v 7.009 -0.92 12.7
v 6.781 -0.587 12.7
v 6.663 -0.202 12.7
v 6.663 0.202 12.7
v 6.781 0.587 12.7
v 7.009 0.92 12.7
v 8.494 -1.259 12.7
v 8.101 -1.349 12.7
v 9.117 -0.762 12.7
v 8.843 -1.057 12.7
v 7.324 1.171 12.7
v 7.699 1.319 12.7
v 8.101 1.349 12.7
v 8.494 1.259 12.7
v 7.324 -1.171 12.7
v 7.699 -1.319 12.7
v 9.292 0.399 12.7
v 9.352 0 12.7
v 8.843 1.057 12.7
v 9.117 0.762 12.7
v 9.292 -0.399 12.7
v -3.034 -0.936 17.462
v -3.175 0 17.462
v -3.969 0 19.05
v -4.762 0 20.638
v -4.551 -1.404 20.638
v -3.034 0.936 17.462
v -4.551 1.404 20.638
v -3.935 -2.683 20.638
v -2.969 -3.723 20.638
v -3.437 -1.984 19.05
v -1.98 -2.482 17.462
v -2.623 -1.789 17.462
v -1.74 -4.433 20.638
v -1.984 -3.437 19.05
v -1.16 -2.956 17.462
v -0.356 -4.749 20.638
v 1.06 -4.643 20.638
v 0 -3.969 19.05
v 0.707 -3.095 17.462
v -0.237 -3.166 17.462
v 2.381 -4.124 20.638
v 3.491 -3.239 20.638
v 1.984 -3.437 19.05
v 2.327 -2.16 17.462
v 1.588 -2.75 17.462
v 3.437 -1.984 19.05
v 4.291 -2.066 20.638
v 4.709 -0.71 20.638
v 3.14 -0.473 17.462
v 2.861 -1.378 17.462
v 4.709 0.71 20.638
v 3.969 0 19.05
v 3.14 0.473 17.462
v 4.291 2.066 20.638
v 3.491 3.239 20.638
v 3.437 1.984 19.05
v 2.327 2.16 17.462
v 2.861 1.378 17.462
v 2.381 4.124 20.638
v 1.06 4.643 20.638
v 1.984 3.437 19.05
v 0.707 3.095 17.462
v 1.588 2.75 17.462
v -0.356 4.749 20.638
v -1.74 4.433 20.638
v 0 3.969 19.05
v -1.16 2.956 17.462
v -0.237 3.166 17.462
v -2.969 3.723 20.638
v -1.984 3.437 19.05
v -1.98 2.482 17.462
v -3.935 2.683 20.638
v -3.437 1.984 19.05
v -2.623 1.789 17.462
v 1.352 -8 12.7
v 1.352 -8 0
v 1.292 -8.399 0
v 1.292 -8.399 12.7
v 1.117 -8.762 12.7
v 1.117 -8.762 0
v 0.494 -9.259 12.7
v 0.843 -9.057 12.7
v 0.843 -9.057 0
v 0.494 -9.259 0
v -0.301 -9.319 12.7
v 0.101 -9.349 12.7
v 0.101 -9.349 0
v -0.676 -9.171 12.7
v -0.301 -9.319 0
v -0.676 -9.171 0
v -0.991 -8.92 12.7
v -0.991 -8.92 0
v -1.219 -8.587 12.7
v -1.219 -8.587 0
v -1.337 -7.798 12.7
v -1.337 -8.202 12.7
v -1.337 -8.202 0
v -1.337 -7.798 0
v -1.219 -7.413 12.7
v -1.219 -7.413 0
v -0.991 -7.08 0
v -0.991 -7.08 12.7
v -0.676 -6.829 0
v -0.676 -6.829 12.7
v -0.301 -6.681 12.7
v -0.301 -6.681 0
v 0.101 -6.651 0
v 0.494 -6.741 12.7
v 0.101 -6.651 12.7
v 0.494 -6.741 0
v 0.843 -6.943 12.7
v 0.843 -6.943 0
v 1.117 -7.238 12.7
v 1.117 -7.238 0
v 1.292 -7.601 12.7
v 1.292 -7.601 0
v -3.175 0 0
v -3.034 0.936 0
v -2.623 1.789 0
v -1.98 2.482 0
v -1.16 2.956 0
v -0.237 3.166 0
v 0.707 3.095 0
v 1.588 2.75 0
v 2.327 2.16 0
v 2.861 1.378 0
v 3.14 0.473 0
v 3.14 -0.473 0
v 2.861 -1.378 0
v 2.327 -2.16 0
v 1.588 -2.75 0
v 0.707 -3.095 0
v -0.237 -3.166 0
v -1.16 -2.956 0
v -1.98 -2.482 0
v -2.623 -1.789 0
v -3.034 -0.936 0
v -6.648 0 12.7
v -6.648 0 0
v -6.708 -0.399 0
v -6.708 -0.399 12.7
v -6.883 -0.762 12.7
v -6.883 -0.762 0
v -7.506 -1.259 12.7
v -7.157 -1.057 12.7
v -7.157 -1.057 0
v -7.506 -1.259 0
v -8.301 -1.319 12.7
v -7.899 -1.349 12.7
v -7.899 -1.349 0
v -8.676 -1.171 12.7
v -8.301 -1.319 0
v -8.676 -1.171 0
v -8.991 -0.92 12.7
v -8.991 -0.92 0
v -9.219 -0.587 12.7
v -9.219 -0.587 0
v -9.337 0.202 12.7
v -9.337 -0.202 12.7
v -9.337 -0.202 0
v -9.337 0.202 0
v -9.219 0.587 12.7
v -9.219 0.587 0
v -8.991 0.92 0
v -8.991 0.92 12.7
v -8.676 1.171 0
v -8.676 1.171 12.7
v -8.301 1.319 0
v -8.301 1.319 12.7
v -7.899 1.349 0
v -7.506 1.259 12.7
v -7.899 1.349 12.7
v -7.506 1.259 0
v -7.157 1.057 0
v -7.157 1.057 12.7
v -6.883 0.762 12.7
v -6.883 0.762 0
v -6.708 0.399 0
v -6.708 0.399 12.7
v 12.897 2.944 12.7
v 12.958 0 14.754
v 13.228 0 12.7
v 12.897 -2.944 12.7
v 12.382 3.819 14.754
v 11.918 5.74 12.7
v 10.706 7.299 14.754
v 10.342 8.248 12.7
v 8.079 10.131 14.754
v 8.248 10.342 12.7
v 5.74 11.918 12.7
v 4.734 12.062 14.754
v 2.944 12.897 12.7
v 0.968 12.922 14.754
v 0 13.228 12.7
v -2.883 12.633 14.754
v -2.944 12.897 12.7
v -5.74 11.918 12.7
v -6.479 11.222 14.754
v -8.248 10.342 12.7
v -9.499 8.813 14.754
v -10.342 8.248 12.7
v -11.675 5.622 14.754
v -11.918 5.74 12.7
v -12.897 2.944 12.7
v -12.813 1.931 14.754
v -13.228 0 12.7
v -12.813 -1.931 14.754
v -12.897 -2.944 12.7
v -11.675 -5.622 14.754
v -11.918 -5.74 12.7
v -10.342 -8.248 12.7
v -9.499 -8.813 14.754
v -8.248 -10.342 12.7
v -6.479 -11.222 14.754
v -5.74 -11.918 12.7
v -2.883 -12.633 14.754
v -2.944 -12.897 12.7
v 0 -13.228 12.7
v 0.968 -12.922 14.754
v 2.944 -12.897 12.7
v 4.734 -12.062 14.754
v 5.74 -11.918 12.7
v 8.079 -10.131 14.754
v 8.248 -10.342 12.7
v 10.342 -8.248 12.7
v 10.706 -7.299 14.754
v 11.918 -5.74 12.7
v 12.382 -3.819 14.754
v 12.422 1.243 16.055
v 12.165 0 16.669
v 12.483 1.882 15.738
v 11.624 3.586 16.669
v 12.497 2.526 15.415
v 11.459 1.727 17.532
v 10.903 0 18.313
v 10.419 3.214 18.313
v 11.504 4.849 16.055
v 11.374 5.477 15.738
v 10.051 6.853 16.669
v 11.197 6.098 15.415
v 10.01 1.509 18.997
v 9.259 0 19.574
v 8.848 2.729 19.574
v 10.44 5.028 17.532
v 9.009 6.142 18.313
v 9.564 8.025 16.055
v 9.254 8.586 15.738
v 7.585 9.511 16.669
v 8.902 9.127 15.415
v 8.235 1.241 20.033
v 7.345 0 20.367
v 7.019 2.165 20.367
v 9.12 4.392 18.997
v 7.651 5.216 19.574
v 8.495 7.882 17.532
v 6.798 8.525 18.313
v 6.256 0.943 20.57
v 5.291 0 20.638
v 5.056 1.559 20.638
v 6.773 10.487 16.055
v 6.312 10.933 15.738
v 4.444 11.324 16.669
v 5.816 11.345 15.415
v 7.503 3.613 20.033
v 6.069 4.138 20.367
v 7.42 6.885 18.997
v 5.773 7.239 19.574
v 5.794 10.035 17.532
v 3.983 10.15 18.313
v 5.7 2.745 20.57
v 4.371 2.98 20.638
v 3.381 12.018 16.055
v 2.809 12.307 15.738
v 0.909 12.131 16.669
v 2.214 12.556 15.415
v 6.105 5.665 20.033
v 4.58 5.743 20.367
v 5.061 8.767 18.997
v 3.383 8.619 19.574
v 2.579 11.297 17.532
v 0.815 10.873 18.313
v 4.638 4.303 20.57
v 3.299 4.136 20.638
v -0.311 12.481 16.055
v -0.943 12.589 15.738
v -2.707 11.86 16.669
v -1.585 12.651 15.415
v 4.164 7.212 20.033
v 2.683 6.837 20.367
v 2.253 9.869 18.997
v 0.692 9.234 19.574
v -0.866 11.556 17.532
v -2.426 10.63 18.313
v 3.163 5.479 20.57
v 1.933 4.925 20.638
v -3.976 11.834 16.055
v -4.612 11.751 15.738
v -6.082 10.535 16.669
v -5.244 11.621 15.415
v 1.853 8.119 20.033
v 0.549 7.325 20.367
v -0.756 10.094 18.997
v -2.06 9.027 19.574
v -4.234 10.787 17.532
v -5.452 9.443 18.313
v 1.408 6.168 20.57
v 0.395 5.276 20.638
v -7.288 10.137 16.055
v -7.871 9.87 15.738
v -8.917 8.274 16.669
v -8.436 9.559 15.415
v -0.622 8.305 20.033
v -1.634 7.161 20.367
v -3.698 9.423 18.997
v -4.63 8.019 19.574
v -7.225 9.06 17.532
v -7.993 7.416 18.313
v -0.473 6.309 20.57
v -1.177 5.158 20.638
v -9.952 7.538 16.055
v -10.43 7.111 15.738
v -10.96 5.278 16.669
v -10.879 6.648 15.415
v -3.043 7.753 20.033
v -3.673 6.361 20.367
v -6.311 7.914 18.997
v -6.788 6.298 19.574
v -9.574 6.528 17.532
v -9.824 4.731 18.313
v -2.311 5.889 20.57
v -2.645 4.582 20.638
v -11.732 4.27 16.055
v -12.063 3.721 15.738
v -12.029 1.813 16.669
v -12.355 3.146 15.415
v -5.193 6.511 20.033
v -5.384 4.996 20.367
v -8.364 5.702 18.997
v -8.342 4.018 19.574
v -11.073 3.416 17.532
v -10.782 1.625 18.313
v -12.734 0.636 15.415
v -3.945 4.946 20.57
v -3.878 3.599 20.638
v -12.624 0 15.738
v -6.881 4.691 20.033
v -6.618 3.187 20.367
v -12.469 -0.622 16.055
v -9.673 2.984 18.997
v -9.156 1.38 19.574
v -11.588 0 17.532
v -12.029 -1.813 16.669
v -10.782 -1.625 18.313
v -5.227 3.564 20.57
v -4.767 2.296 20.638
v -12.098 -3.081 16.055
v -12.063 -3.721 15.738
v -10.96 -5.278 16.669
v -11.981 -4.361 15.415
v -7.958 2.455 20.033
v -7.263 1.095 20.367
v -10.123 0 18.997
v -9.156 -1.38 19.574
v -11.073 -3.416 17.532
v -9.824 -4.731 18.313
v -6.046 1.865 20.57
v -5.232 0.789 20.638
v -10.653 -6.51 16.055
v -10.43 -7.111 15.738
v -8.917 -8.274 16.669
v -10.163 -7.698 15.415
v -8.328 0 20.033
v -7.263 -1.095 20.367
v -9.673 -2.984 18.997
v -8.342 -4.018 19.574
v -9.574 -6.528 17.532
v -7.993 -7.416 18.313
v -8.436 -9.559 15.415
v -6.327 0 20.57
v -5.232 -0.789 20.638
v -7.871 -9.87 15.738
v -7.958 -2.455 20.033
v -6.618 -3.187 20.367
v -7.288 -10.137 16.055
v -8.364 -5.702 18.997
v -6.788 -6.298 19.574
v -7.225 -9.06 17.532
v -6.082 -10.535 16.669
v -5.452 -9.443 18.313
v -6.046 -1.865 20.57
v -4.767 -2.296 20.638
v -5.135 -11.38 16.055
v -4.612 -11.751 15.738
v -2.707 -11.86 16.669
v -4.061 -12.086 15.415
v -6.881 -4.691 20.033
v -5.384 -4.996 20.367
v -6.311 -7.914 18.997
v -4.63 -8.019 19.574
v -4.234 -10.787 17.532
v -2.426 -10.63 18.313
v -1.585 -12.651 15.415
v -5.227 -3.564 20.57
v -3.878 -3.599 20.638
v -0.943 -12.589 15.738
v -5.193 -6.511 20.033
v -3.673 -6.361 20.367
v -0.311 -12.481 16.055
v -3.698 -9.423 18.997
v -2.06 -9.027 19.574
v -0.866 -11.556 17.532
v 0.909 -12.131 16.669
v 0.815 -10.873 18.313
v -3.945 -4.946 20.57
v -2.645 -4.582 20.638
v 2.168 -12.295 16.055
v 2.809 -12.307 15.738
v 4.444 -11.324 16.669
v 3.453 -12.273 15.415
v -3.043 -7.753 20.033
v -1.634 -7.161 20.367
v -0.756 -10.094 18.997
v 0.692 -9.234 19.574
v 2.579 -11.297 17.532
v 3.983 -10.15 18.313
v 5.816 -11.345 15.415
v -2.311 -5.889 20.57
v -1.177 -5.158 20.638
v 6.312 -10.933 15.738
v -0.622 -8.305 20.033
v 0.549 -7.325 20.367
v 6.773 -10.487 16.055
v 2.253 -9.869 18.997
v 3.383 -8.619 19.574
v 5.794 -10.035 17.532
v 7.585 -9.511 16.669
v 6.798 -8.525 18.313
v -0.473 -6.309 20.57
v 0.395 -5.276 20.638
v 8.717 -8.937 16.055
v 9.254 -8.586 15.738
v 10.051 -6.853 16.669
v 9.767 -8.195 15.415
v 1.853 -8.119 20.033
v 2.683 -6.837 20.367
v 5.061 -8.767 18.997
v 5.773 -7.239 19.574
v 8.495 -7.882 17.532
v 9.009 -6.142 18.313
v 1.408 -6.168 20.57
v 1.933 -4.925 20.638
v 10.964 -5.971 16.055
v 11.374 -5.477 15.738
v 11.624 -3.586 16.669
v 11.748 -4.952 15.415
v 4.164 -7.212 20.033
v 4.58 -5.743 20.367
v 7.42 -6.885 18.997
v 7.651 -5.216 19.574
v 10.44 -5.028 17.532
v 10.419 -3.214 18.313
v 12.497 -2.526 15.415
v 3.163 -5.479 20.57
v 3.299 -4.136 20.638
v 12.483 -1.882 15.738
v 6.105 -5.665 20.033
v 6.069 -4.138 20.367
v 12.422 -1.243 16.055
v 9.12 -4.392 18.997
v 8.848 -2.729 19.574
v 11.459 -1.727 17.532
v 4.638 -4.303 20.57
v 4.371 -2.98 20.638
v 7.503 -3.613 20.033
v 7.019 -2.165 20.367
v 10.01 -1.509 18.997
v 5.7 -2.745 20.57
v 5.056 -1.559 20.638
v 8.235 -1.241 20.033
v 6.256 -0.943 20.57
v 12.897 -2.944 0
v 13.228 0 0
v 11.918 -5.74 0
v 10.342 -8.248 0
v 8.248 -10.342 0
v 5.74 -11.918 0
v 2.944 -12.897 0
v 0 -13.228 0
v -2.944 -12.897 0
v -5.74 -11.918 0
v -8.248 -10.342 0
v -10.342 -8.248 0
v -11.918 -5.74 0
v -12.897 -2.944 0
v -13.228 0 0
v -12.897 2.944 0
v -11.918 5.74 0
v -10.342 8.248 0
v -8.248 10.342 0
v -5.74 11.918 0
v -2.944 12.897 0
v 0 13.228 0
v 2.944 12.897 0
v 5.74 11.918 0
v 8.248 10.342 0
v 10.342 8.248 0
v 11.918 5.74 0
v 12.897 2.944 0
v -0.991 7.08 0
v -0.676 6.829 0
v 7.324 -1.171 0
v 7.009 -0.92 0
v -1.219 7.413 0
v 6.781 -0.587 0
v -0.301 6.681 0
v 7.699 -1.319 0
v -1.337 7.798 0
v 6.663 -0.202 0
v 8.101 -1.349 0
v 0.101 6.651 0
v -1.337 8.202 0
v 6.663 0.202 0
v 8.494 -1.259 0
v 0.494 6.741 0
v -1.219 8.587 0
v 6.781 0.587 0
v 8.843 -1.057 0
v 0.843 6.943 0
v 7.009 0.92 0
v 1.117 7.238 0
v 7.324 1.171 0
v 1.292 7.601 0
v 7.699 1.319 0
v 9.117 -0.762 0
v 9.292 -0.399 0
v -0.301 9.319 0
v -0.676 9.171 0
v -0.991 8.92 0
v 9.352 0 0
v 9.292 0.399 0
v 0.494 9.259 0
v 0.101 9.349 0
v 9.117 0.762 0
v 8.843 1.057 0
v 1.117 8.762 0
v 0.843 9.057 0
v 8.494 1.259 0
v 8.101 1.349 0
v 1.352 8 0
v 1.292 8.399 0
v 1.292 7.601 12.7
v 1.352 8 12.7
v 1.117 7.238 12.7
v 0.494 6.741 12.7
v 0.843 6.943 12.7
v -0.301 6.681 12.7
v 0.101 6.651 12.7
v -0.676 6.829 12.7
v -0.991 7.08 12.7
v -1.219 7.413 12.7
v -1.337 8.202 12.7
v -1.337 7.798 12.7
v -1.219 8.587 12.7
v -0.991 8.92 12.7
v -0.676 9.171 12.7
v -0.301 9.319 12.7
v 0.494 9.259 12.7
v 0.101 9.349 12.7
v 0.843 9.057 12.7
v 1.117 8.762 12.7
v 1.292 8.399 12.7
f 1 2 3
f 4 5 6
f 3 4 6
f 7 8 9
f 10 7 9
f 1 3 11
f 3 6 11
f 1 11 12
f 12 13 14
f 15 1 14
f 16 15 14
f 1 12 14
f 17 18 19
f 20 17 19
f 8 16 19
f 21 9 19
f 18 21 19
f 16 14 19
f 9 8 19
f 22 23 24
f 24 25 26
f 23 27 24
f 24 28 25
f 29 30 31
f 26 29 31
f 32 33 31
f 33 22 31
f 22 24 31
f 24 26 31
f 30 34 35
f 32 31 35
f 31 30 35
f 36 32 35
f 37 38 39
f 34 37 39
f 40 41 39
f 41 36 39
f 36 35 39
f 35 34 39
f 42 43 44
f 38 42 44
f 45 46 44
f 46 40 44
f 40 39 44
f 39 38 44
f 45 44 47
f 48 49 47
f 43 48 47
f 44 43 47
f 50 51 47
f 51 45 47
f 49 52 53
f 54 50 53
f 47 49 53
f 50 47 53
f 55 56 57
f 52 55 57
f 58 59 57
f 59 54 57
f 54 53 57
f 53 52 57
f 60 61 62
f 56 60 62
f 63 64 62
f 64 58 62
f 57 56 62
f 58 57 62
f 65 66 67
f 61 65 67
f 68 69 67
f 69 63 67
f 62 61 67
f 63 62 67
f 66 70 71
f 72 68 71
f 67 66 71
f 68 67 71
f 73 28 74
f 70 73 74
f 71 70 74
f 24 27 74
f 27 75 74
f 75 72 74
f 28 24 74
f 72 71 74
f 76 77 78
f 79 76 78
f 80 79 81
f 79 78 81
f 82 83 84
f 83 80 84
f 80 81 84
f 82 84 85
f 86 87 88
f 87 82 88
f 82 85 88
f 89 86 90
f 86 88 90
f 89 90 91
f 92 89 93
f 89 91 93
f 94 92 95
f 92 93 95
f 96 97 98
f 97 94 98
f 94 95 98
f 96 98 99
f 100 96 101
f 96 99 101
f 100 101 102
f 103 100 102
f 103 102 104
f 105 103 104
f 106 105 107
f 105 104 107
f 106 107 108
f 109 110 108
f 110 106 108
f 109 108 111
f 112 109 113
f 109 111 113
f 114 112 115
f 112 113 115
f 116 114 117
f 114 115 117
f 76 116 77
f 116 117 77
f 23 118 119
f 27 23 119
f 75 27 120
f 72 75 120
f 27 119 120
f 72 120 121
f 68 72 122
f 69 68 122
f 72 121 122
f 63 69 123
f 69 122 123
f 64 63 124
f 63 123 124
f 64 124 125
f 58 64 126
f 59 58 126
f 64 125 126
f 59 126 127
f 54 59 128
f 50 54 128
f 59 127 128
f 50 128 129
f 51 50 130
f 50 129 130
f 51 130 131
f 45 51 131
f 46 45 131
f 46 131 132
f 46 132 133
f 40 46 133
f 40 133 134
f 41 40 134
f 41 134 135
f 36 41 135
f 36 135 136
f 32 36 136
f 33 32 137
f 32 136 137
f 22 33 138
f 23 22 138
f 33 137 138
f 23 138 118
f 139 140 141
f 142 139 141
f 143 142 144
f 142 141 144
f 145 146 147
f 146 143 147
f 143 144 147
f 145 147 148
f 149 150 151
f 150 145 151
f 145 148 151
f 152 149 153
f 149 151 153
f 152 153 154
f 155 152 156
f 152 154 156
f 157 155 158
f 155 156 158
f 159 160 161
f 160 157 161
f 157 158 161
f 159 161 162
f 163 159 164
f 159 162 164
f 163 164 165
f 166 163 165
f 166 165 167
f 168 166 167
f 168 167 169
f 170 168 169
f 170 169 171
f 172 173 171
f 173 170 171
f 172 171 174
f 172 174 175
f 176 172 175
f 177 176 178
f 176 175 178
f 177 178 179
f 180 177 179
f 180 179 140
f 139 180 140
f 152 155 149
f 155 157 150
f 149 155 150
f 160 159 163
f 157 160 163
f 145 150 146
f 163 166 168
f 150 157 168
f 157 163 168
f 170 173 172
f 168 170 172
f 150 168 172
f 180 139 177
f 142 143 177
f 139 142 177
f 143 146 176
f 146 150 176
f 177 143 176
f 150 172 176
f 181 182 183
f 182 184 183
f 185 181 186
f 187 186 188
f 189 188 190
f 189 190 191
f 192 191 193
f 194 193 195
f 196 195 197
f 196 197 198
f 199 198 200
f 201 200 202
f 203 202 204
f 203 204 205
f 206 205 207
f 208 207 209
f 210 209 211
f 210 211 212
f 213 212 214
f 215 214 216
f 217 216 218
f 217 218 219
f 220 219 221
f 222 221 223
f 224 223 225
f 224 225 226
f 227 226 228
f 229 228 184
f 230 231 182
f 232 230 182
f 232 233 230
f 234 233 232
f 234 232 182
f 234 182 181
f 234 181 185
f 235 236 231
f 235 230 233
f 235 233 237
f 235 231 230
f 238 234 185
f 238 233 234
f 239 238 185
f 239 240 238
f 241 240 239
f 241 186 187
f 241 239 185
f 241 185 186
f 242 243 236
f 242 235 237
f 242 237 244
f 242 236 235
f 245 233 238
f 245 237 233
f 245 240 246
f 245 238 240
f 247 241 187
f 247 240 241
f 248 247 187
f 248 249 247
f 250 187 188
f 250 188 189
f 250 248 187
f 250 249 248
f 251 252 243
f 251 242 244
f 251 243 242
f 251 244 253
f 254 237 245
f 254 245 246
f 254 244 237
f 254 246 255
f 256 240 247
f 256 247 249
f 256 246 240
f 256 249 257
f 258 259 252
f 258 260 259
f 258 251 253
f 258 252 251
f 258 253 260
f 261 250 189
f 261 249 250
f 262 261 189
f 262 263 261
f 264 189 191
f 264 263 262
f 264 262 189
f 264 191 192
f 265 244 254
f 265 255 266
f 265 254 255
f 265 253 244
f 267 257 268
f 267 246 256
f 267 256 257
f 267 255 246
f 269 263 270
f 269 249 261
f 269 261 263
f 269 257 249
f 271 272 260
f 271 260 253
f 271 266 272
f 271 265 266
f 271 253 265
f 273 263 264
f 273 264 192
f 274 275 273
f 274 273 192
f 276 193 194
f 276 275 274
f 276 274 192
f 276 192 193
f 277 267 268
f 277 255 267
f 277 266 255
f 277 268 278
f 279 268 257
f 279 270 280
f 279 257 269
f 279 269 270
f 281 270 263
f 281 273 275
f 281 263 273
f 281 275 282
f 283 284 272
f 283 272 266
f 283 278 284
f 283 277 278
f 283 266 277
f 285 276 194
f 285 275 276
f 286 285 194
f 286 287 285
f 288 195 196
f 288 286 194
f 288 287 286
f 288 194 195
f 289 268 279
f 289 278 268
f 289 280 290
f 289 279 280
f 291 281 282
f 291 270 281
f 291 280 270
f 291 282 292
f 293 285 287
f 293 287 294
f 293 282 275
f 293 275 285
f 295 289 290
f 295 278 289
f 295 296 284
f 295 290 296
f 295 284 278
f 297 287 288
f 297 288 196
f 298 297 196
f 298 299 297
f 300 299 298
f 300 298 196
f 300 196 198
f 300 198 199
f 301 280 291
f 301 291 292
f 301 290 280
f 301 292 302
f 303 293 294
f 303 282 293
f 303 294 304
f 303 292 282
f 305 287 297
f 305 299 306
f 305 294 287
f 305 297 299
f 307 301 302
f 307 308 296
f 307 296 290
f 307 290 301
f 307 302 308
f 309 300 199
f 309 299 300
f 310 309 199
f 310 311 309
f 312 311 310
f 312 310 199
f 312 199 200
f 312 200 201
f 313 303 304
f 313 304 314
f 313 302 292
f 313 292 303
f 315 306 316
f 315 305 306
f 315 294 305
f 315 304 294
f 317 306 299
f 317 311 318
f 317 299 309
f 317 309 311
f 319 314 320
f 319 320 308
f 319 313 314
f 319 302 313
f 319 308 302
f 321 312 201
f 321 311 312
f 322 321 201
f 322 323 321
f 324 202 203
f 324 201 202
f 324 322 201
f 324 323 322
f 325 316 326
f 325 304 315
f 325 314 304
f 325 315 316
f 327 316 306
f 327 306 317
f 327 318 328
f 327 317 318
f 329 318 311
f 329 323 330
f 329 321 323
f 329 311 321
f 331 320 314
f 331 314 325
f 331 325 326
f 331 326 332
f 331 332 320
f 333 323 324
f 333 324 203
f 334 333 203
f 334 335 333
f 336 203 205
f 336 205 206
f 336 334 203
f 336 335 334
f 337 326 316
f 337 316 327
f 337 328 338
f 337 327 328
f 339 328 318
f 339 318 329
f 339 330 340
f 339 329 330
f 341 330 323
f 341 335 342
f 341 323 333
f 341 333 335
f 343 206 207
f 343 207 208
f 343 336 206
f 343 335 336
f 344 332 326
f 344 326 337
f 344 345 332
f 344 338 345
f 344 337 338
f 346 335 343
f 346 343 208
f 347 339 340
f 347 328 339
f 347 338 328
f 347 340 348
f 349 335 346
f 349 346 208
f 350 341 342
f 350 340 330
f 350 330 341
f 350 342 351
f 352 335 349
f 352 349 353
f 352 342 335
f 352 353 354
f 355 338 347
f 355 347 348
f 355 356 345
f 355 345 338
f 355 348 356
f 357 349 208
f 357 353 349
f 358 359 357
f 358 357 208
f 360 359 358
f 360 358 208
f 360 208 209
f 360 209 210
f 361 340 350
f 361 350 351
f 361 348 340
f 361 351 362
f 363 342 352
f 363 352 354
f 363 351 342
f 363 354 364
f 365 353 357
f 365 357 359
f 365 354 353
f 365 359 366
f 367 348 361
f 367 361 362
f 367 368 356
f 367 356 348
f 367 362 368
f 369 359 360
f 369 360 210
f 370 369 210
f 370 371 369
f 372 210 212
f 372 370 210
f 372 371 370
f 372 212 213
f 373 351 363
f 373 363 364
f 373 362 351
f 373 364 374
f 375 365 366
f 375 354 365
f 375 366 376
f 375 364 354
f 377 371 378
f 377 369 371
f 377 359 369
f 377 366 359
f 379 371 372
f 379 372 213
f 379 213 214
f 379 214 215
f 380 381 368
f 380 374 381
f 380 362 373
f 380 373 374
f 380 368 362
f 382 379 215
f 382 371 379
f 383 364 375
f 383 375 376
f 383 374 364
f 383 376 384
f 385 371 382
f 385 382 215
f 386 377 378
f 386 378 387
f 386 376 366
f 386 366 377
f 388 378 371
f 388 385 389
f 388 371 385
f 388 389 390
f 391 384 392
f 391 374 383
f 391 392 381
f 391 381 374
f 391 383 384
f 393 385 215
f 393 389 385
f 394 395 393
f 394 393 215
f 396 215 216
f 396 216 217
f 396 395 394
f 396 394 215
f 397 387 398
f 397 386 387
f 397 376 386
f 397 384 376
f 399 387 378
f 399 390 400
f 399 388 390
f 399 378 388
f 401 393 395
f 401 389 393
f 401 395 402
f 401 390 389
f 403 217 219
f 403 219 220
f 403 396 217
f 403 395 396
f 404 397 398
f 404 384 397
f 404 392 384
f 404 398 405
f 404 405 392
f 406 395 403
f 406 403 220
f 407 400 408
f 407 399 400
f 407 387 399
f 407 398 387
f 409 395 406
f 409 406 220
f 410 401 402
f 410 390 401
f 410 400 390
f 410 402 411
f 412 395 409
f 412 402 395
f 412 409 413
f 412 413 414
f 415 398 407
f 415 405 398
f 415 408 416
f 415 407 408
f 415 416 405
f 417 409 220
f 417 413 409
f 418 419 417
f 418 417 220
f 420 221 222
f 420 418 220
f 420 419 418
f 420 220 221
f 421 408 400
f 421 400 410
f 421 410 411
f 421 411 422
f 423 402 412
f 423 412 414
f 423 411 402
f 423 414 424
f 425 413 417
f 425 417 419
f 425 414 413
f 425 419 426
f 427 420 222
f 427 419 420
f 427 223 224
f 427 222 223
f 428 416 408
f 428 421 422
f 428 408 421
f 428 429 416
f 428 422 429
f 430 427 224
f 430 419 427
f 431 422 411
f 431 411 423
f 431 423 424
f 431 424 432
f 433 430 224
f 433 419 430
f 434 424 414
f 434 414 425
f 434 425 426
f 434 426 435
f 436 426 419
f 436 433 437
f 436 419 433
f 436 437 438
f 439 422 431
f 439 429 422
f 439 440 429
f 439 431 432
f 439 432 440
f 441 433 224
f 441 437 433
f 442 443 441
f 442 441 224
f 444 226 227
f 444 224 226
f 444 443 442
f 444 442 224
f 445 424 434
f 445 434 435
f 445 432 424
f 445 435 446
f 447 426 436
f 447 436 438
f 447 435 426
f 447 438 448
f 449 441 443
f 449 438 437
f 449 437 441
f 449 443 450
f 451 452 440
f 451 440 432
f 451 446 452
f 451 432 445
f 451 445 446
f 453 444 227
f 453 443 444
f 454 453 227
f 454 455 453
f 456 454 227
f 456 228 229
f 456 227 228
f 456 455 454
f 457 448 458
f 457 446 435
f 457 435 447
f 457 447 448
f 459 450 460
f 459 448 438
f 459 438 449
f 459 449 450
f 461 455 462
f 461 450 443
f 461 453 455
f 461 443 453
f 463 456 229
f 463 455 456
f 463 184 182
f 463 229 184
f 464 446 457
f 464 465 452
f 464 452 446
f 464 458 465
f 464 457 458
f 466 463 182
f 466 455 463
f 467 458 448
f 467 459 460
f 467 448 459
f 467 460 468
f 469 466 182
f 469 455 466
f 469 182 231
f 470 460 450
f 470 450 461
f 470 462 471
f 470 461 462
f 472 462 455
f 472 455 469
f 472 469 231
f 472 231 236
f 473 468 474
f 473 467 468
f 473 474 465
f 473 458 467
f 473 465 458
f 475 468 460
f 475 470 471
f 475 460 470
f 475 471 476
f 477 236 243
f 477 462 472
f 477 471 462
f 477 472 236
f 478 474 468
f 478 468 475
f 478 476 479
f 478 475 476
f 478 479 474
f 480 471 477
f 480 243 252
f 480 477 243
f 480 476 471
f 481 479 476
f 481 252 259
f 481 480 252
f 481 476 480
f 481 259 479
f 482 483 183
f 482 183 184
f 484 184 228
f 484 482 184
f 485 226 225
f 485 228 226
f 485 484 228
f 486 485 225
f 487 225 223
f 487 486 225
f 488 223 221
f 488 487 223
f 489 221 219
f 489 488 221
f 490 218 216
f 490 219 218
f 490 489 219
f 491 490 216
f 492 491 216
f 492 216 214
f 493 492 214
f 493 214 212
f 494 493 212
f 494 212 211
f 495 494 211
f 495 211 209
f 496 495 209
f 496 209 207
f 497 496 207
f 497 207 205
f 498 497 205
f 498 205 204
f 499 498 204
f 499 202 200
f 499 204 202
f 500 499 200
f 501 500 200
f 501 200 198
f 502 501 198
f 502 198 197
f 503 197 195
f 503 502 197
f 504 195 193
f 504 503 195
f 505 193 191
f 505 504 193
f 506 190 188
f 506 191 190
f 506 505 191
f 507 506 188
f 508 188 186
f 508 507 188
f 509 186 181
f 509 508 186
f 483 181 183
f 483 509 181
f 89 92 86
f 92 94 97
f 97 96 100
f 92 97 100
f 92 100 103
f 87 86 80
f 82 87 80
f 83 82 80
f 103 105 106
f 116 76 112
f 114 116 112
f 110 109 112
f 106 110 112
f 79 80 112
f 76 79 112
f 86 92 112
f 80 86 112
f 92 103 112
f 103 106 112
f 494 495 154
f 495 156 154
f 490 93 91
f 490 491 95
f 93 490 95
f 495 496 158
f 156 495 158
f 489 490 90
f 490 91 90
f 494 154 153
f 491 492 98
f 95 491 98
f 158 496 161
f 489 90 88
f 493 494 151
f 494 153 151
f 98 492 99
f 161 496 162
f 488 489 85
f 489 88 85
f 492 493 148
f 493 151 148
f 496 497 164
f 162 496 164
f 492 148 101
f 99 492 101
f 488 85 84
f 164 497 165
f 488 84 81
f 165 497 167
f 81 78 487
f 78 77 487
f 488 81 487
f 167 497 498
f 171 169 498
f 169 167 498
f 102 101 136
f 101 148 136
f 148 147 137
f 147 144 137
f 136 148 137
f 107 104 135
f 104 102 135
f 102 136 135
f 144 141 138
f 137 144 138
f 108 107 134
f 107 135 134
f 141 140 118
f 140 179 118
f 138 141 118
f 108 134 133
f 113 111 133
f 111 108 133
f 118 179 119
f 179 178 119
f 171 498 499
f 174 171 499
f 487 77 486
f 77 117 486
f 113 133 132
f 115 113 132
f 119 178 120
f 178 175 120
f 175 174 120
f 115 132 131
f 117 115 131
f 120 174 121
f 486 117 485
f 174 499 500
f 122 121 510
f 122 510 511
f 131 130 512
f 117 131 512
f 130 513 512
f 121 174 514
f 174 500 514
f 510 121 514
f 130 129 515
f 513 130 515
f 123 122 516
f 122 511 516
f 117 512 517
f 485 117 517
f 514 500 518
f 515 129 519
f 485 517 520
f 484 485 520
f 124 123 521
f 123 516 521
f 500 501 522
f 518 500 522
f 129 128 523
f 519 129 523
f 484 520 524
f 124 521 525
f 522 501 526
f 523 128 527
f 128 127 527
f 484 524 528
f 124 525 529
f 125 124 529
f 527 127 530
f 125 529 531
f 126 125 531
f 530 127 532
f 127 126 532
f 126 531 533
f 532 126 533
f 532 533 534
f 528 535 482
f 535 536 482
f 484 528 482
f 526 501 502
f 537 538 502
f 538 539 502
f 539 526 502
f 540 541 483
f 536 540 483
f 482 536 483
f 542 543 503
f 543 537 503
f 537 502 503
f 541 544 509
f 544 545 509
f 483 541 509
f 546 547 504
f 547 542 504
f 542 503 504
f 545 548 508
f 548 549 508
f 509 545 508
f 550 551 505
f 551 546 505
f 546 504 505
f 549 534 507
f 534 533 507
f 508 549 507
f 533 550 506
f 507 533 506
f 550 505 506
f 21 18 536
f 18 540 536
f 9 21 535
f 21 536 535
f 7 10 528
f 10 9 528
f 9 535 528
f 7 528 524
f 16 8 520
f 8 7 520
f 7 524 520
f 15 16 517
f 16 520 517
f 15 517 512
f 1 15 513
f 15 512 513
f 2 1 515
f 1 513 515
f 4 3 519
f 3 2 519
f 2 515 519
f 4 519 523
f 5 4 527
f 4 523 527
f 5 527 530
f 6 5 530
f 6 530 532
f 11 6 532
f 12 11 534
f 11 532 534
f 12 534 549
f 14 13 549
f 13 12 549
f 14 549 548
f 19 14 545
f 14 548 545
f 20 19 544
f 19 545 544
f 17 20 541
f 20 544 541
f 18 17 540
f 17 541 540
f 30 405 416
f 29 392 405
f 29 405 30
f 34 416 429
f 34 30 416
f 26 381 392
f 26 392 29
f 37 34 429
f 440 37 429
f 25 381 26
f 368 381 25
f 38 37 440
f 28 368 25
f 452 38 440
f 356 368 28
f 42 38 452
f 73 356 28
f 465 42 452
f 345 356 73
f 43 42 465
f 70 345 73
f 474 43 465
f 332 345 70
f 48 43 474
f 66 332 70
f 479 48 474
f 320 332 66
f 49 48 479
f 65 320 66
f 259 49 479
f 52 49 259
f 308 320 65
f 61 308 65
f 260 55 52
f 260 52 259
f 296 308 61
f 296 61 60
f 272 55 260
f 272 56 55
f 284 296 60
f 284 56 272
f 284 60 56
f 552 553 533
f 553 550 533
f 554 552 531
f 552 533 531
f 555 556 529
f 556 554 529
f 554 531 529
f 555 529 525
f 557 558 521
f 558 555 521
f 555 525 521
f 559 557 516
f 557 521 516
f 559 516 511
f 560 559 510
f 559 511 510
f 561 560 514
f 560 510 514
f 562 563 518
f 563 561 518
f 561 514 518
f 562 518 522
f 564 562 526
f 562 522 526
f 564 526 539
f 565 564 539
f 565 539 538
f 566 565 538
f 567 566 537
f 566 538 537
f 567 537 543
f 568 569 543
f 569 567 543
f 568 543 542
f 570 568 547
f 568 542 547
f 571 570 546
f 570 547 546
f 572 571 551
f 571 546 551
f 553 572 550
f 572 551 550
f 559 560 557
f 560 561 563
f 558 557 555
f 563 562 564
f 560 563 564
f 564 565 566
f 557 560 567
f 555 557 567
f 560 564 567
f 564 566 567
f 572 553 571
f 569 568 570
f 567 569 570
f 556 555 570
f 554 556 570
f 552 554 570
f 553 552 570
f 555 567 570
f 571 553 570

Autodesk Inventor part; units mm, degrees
ref_plane "YZ Plane" through (0, 0, 0) normal (1, 0, 0) x (0, 1, 0)
ref_plane "XZ Plane" through (0, 0, 0) normal (0, 1, 0) x (-1, 0, 0)
ref_plane "XY Plane" through (0, 0, 0) normal (0, 0, 1) x (1, 0, 0)
sketch "Sketch1" plane through (0, 0, 0) normal (0, 0, 1) x (1, 0, 0)
  circle A0 centre (0, 0) radius 13.2282
  circle A1 centre (0, 0) radius 3.05
  circle A2 centre (-8, 0) radius 1.3525
  circle A3 centre (0, 8) radius 1.3525
  circle A4 centre (8, 0) radius 1.3525
  circle A5 centre (0, -8) radius 1.3525
  dimension "d12" = 6.1
  dimension "d13" = 2.705
  dimension "d14" = 2.705
  dimension "d15" = 2.705
  dimension "d16" = 2.705
extrude "Extrusion1" add sketch "Sketch1" along normal blind 12.7
sketch "Sketch7" plane through (0, 0, 12.7) normal (0, 0, 1) x (1, 0, 0)
  circle A0 centre (0, 0) radius 3.05
  circle A1 centre (0, 0) radius 13.2282 projected
extrude "Extrusion6" add sketch "Sketch7" along normal blind 7.9375
fillet "Fillet2" radius 7.9375 1 edges at (-13.2282, 0, 20.6375)
sketch "Sketch8" plane through (0, 0, 0) normal (0, 0, -1) x (-1, 0, 0)
  circle A0 centre (0, 0) radius 3.175
  dimension "d21" = 6.35
extrude "Extrusion7" cut sketch "Sketch8" against normal through all
chamfer "Chamfer1" distance 1.5875 distance2 3.175 1 edges at (3.175, 0, 20.6375) measured on face at (4.5034, -0.6753, 20.6375)
properties part number "adaptor"
